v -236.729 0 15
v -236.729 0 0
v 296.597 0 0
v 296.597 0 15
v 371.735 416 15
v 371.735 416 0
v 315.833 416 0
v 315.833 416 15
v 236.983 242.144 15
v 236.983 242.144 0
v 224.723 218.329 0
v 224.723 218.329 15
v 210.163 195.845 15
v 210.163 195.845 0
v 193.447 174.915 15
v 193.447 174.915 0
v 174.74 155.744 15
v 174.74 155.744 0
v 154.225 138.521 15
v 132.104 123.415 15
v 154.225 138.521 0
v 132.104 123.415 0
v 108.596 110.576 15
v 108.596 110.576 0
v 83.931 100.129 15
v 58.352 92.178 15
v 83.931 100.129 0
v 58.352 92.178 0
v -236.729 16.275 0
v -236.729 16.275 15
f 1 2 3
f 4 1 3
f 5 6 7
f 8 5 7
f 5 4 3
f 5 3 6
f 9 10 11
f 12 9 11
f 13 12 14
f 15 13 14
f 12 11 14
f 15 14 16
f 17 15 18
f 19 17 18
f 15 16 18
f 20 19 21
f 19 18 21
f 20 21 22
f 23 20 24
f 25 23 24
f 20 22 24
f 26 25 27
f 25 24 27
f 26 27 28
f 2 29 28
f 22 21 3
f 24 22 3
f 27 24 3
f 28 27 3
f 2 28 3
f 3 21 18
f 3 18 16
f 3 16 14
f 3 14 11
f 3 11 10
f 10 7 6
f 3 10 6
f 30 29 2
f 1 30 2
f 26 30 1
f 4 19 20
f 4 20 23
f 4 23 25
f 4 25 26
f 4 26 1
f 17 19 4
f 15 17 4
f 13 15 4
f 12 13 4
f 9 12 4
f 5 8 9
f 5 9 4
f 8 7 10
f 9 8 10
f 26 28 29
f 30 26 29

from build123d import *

# Parameters (mm, degrees)
BOSS_EXTRUDE1_DEPTH     = 15
CUT_EXTRUDE1_DEPTH      = 1
CUT_EXTRUDE1_DEPTH_BACK = 16


with BuildPart() as part:
    # Sketch1 → Boss-Extrude1 (new body)
    with BuildSketch(Plane.XY):
        with BuildLine():
            Line((-236.729376996, 0), (0, 0))
            Line((0, 0), (357.876847169, 0))
            Line((357.876847169, 0), (396.730398779, 416))
            Line((396.730398779, 416), (315.832809595, 416))
            Line((315.832809595, 416), (236.983089551, 242.144494596))
            ThreePointArc((236.983089551, 242.144494596), (164.696190822, 146.877858304), (58.352308735, 92.177707838))
            Line((58.352308735, 92.177707838), (-236.729376996, 16.274880501))
            Line((-236.729376996, 16.274880501), (-236.729376996, 0))
        make_face()
    extrude(amount=BOSS_EXTRUDE1_DEPTH)

    # Sketch2 → Cut-Extrude1 (cut, two sides)
    with BuildSketch(Plane.XY.offset(15)) as cut_extrude1_sk:
        Polygon((396.730398779, 416), (357.876847169, 0), (296.597151769, 0), (371.734942748, 416), align=None)
    extrude(amount=CUT_EXTRUDE1_DEPTH, mode=Mode.SUBTRACT)
    extrude(cut_extrude1_sk.sketch, amount=-CUT_EXTRUDE1_DEPTH_BACK, mode=Mode.SUBTRACT)


solid = part.part
